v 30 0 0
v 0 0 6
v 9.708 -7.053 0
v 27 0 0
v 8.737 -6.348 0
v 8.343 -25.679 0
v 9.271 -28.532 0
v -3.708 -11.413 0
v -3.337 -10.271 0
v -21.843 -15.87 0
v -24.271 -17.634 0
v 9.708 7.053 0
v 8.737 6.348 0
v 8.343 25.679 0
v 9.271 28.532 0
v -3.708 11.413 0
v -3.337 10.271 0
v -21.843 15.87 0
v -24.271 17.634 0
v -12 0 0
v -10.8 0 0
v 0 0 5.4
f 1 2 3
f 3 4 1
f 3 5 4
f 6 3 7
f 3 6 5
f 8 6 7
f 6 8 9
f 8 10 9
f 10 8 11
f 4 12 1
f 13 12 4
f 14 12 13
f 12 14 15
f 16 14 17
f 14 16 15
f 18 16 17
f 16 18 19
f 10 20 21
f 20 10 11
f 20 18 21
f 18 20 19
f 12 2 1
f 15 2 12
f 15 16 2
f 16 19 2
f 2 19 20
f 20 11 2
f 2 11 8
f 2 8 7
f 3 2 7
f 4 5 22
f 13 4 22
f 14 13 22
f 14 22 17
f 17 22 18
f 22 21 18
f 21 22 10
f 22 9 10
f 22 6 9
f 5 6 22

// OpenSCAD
burst_r1 = 30;
burst_r2 = 12;
burst_number = 5;
burst_height = 6;
two_sides = "NO";
hollow = "YES";
inside_scale = 0.9;

module star(burst_r1, burst_r2, burst_number, burst_height) {
    a = 180 / burst_number;

    p0 = [0, 0, 0];
    p1 = [burst_r2 * cos(a), burst_r2 * sin(a), 0];
    p2 = [burst_r1, 0, 0];
    p3 = [0, 0, burst_height];

    module half_burst() {
        polyhedron(points = [p0, p1, p2, p3], 
            faces = [
                [0, 2, 1],
                [0, 1, 3],
                [0, 3, 2], 
                [2, 1, 3]
            ]
        );
    }

    module burst() {
        hull() {
            half_burst();
            mirror([0, 1,0]) half_burst();
        }
    }

    union() {
        for(i = [0 : burst_number - 1]) {
            rotate(2 * a * i) burst();
        }
    }
}

if(hollow == "YES") {
    difference() {
        star(burst_r1, burst_r2, burst_number, burst_height);
        scale(inside_scale) star(burst_r1, burst_r2, burst_number, burst_height);
    }
    if(two_sides == "YES") {
       mirror([0, 0, 1]) difference() {
          star(burst_r1, burst_r2, burst_number, burst_height);
          scale(inside_scale) star(burst_r1, burst_r2, burst_number, burst_height);
      }
    } 
} else {
    star(burst_r1, burst_r2, burst_number, burst_height);
    if(two_sides == "YES") {
       mirror([0, 0, 1]) star(burst_r1, burst_r2, burst_number, burst_height);
    } 
}
